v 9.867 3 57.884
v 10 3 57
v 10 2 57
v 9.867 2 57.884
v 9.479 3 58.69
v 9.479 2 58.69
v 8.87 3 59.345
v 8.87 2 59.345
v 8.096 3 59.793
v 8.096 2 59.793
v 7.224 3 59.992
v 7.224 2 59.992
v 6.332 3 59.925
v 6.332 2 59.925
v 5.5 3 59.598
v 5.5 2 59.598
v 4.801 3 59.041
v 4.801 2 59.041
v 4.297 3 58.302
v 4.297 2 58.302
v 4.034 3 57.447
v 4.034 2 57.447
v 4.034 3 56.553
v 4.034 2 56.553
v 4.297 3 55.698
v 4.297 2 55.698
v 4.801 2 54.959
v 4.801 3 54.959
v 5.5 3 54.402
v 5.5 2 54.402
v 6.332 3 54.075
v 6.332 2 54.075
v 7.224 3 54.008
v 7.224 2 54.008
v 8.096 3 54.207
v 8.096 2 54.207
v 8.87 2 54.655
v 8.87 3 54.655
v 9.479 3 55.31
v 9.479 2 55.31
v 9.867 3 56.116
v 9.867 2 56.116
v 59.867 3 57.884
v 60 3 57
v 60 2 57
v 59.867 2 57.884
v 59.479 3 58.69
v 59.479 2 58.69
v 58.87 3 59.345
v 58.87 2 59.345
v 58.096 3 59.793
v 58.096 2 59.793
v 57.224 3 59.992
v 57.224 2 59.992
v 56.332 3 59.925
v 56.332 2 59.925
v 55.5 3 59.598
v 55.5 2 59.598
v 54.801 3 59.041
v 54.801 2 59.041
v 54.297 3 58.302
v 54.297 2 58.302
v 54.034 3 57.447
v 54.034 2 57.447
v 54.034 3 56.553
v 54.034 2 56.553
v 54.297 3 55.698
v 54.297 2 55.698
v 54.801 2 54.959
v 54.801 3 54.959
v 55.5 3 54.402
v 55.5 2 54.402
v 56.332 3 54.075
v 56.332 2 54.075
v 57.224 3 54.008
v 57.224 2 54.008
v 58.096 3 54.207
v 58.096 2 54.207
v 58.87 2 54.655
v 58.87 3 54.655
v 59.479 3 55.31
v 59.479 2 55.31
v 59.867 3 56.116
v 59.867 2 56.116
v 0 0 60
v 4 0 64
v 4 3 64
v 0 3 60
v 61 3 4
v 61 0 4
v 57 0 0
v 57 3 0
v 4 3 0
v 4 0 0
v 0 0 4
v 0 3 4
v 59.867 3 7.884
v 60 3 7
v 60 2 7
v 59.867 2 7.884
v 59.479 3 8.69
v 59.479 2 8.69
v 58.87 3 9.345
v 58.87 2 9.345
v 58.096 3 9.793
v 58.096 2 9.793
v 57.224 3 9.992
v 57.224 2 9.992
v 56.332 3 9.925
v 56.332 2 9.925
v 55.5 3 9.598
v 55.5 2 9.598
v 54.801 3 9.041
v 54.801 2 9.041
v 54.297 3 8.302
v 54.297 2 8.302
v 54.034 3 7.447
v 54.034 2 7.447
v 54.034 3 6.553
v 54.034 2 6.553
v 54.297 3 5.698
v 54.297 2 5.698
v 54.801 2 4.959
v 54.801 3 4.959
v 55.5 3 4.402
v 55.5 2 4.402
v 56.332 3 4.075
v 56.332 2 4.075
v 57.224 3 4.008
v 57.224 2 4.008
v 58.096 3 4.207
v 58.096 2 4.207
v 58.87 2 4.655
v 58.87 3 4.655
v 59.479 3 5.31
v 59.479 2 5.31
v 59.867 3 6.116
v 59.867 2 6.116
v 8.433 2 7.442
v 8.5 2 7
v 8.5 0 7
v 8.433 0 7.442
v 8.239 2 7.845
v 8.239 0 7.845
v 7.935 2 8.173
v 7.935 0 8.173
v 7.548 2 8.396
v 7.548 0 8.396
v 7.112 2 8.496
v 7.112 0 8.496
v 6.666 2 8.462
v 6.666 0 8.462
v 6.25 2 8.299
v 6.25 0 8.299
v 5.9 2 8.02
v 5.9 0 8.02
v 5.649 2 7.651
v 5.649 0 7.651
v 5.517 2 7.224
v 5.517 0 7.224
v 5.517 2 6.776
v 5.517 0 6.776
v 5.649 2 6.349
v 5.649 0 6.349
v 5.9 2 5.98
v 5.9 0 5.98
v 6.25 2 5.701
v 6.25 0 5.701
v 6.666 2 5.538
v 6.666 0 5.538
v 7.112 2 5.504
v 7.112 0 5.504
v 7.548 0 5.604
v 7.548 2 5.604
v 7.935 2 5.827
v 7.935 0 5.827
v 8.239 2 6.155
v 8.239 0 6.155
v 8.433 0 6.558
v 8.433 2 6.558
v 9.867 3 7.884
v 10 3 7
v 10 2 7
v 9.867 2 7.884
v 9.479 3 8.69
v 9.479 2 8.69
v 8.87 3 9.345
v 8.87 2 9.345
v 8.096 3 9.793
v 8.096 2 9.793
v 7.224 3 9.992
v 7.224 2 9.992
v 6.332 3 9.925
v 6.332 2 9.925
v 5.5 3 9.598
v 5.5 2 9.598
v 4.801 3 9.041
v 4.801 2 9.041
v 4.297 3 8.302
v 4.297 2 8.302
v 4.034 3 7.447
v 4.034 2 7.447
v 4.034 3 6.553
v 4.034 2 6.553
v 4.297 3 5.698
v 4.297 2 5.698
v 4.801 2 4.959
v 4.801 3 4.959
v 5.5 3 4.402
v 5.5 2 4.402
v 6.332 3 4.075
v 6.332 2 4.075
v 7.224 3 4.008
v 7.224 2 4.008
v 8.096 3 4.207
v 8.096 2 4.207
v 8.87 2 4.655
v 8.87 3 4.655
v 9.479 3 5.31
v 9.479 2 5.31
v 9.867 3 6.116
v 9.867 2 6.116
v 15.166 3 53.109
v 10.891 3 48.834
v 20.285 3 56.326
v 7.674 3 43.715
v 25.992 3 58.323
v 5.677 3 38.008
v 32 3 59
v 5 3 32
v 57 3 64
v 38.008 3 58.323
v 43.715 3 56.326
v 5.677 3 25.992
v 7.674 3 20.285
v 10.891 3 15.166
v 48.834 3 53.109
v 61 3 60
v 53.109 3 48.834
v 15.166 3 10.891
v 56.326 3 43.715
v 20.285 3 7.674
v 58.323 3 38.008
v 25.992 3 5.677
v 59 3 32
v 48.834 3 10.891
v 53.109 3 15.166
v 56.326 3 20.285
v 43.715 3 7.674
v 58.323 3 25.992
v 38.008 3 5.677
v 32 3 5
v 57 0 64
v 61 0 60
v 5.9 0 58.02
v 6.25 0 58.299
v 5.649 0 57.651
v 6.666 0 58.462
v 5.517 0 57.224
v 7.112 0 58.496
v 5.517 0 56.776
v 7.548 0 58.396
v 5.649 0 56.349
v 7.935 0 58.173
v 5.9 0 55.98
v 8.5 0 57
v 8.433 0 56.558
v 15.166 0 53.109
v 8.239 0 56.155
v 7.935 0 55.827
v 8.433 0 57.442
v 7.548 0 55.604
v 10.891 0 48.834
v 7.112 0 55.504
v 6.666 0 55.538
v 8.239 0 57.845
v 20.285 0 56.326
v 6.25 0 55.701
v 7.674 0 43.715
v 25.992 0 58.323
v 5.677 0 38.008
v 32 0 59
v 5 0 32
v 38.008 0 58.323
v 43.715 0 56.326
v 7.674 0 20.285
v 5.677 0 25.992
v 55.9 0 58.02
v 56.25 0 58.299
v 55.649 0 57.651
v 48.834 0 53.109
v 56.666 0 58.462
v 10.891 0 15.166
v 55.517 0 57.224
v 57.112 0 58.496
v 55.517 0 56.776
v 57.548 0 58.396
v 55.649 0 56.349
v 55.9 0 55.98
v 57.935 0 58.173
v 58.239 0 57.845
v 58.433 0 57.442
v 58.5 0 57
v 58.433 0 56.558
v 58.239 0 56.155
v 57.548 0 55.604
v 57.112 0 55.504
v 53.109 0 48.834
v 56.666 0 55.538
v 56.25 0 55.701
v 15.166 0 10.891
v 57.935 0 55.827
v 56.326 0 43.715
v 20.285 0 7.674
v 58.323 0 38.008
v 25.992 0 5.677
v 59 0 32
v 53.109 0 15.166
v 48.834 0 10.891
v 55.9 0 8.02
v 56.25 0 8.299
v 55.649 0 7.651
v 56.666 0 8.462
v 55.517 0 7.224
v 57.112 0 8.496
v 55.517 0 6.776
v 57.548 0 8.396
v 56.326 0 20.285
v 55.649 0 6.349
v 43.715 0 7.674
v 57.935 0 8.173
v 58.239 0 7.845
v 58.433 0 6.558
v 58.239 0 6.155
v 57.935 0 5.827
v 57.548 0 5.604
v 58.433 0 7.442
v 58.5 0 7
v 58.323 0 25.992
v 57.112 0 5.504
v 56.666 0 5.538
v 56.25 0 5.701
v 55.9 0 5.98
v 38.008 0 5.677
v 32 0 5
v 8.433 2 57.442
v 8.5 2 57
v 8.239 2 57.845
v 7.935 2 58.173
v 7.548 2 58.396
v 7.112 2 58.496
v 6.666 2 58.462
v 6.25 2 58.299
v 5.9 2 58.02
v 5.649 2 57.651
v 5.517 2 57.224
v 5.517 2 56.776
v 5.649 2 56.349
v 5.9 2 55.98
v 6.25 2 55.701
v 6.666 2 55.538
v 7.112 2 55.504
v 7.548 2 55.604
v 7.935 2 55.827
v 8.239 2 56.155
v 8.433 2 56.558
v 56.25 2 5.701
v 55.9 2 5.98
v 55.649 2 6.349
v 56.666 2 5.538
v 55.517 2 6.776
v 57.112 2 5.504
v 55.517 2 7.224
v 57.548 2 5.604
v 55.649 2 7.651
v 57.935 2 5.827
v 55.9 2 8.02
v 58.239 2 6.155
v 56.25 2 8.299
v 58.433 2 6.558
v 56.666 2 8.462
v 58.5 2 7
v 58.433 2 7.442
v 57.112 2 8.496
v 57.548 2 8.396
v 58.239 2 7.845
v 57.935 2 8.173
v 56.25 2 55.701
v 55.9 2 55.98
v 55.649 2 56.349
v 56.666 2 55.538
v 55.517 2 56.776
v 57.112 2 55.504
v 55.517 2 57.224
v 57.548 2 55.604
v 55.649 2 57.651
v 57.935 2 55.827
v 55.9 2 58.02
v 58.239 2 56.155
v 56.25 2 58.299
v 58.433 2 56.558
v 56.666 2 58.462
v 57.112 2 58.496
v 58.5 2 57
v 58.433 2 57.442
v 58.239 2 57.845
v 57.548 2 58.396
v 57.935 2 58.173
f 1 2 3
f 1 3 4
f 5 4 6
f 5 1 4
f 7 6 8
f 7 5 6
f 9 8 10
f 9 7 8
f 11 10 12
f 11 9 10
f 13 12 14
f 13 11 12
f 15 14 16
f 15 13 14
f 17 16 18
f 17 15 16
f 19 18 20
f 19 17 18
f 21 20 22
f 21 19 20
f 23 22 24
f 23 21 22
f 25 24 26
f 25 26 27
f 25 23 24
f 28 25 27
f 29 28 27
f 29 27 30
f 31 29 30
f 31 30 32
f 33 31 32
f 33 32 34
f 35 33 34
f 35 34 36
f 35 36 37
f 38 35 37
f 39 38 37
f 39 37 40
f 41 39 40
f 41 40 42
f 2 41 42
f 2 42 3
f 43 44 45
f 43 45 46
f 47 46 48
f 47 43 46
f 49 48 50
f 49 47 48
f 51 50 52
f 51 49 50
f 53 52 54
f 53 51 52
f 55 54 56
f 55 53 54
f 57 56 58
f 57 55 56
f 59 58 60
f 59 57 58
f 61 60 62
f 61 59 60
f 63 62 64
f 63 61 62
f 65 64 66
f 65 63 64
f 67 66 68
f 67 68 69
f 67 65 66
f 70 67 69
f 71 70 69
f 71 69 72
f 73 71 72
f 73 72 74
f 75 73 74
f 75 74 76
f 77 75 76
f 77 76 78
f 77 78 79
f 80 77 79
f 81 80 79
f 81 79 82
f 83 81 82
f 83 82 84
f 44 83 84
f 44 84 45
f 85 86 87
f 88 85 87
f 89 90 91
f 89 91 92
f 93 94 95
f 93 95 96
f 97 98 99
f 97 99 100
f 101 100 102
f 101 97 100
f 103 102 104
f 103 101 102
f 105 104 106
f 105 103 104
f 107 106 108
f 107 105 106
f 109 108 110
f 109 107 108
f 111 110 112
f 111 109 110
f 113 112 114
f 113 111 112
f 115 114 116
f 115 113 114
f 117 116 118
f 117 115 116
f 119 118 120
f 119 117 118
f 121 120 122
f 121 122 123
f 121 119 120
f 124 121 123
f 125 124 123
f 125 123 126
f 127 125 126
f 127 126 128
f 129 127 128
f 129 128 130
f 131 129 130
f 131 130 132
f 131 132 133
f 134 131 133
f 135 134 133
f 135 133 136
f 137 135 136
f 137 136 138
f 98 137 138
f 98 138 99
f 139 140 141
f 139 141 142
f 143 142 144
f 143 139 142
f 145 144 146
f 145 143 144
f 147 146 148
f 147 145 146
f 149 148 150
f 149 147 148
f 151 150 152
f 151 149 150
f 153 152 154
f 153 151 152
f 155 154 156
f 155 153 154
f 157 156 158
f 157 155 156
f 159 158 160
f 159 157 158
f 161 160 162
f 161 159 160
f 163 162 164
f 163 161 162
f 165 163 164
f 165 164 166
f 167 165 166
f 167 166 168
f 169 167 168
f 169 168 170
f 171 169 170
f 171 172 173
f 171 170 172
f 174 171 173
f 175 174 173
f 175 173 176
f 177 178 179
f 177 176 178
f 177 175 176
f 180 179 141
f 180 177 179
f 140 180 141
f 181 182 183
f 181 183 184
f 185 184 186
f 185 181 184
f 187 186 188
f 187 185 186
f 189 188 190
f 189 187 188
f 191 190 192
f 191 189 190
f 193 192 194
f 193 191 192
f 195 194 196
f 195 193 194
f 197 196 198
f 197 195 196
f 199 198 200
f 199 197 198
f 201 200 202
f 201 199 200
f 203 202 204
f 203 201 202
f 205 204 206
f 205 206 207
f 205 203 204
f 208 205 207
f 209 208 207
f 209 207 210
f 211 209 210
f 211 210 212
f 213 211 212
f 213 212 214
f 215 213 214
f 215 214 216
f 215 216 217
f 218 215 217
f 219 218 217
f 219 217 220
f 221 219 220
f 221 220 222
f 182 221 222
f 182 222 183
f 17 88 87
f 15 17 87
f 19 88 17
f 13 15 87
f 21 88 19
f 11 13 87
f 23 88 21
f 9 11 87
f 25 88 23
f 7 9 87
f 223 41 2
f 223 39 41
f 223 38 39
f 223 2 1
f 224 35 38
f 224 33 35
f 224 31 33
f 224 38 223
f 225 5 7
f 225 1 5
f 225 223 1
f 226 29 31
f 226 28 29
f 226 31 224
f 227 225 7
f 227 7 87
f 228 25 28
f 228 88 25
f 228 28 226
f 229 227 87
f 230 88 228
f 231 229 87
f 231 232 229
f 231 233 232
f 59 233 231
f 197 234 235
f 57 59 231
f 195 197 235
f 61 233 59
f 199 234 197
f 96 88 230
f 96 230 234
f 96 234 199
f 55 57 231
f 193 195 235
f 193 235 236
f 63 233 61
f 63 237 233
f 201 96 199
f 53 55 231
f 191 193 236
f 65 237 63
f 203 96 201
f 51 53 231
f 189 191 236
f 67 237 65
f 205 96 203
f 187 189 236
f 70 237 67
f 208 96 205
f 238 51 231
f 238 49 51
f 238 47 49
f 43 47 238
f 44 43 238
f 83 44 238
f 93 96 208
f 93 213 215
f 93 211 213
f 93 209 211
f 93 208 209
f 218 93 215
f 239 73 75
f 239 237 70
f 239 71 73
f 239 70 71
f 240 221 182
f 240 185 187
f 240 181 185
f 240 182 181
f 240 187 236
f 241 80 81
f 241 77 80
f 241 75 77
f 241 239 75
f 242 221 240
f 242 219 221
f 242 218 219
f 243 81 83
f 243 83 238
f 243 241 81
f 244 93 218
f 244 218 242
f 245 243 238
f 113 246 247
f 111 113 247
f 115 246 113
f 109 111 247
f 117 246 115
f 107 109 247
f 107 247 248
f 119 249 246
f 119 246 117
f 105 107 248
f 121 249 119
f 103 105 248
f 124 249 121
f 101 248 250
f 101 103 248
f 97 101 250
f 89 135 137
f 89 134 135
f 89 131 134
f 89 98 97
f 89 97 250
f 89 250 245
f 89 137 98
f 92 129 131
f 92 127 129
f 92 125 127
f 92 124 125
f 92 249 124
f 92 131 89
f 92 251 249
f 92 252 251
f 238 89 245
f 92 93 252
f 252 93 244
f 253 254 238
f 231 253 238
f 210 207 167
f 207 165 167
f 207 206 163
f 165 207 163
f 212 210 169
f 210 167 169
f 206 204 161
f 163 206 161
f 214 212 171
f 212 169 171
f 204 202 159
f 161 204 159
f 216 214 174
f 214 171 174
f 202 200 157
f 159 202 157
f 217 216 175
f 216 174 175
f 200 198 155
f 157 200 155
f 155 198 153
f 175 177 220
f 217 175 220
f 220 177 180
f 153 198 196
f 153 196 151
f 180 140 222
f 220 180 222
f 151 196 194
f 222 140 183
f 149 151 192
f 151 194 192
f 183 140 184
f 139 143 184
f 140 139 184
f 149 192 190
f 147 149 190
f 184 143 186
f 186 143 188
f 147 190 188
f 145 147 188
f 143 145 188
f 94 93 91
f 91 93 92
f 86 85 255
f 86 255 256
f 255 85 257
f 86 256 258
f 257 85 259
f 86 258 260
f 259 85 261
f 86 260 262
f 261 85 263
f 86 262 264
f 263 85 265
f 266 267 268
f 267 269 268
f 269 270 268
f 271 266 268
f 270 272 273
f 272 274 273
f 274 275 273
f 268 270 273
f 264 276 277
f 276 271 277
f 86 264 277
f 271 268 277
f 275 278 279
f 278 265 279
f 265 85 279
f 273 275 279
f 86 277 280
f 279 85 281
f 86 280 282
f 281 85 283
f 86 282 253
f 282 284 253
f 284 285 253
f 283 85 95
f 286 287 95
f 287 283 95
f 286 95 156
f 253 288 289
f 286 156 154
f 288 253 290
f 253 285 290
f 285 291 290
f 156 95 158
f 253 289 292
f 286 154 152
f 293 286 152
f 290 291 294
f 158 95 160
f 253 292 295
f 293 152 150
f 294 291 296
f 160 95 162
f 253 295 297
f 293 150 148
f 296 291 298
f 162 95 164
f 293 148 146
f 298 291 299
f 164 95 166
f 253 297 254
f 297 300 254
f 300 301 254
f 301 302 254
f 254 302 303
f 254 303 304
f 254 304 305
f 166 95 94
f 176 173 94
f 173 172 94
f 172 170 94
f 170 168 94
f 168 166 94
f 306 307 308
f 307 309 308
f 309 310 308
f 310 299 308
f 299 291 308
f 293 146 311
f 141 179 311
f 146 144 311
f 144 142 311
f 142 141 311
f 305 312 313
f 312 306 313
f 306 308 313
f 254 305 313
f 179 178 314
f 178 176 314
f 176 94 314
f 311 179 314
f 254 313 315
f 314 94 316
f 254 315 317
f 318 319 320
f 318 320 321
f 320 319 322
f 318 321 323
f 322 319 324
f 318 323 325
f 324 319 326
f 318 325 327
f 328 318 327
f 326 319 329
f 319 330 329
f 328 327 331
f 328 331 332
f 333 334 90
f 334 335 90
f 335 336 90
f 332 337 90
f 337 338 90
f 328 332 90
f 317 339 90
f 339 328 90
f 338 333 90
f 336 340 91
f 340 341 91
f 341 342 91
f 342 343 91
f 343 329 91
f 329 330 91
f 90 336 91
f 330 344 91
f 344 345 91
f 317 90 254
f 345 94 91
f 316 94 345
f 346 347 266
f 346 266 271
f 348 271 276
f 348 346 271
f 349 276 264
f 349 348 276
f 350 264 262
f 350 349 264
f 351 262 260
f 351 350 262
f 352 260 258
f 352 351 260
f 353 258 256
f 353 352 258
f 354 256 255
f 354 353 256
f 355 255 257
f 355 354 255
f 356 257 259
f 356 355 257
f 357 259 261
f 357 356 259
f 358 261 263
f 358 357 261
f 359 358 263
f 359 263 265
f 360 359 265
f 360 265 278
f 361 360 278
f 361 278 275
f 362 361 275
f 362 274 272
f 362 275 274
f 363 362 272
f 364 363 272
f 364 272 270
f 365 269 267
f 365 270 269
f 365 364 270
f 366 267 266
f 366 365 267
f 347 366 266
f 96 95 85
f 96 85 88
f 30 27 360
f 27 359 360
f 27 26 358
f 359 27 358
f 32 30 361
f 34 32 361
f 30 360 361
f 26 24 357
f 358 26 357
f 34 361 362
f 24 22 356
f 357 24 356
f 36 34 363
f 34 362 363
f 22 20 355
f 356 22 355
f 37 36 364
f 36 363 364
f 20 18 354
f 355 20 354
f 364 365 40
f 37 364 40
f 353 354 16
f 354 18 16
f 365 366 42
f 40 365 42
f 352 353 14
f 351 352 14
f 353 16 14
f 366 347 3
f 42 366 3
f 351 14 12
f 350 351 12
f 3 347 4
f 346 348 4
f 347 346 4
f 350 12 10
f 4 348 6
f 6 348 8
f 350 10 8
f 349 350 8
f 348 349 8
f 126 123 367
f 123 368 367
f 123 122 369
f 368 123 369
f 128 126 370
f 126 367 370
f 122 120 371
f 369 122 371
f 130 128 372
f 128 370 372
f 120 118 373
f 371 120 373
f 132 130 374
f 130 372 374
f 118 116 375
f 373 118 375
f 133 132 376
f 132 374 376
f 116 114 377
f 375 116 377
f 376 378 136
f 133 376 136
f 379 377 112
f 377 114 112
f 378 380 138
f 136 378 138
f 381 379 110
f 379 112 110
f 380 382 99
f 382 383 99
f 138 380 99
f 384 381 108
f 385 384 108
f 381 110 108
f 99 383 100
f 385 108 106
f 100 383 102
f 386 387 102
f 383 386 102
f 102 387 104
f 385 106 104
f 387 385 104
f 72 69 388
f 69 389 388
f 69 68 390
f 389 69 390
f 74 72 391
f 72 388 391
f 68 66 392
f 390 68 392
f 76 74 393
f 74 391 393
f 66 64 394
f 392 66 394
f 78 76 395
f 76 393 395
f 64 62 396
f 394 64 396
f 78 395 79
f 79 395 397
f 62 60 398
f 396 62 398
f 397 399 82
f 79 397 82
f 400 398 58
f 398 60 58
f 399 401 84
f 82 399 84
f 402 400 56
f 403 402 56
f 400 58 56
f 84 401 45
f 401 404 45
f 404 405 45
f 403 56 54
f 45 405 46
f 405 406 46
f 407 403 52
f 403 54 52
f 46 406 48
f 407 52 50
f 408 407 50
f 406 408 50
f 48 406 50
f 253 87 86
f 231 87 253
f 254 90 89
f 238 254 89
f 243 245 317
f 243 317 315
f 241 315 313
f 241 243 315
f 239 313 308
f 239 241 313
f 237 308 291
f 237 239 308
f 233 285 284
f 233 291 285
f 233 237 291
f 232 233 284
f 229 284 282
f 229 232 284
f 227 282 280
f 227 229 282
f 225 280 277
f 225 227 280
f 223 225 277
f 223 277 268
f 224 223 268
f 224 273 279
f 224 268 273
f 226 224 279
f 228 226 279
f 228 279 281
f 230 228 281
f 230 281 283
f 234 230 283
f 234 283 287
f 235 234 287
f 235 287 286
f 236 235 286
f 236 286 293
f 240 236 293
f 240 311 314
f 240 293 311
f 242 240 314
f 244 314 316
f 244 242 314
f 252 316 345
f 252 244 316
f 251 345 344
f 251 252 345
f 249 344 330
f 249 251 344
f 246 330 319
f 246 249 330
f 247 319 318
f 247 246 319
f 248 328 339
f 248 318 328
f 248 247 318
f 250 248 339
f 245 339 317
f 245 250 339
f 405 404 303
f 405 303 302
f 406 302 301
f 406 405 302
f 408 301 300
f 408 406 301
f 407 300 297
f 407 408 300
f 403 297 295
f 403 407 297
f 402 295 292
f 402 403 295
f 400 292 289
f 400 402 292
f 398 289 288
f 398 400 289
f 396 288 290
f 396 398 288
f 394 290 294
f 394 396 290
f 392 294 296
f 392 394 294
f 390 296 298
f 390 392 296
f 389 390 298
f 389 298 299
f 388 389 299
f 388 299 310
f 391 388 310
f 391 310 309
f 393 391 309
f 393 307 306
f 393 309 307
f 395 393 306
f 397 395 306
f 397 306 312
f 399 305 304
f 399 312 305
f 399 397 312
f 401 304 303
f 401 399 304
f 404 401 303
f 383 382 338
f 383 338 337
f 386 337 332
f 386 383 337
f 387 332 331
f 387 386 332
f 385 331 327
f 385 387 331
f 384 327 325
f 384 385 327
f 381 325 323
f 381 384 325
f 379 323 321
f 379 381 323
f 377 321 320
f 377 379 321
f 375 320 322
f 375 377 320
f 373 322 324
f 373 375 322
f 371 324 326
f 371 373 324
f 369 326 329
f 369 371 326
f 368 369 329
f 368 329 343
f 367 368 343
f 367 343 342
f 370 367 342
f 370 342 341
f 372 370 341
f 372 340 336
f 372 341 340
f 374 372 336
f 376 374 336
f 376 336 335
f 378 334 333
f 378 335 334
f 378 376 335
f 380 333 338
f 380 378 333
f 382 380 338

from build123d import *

# Parameters (mm, degrees)
CYLINDER871_R     = 3
CYLINDER871_DEPTH = 3
CYLINDER872_R     = 3
CYLINDER872_DEPTH = 3
CYLINDER873_R     = 3
CYLINDER873_DEPTH = 3
CYLINDER870_R     = 3
CYLINDER870_DEPTH = 3
CYLINDER867_R     = 27
CYLINDER867_DEPTH = 10
CYLINDER864_R     = 1.5
CYLINDER864_DEPTH = 10
CYLINDER865_R     = 1.5
CYLINDER865_DEPTH = 10
CYLINDER866_R     = 1.5
CYLINDER866_DEPTH = 10
CYLINDER863_R     = 1.5
CYLINDER863_DEPTH = 10
BOX418_W          = 61
BOX418_H          = 3
BOX418_DEPTH      = 64
CHAMFER023_SIZE   = 4
CHAMFER024_SIZE   = 4


with BuildPart() as v_lec871:
    # Cylinder871 → Cylinder871 (new body)
    with BuildSketch(Plane(origin=(50, 0, 0), x_dir=(1, 0, 0), z_dir=(0, -1, 0))):
        Circle(CYLINDER871_R)
    extrude(amount=CYLINDER871_DEPTH)


with BuildPart() as v_lec872:
    # Cylinder872 → Cylinder872 (new body)
    with BuildSketch(Plane(origin=(50, 0, 50), x_dir=(1, 0, 0), z_dir=(0, -1, 0))):
        Circle(CYLINDER872_R)
    extrude(amount=CYLINDER872_DEPTH)


with BuildPart() as v_lec873:
    # Cylinder873 → Cylinder873 (new body)
    with BuildSketch(Plane(origin=(0, 0, 50), x_dir=(1, 0, 0), z_dir=(0, -1, 0))):
        Circle(CYLINDER873_R)
    extrude(amount=CYLINDER873_DEPTH)


with BuildPart() as compound499:
    # Cylinder870 → Cylinder870 (new body)
    with BuildSketch(Plane.XZ):
        Circle(CYLINDER870_R)
    extrude(amount=CYLINDER870_DEPTH)

    # Compound499: union Válec871, Válec872, Válec873
    add(v_lec871.part)
    add(v_lec872.part)
    add(v_lec873.part)


with BuildPart() as compound499_1:
    # Compound499 placement: moved
    add(compound499.part.moved(Location((7, 5, 7))))


with BuildPart() as v_lec867:
    # Cylinder867 → Cylinder867 (new body)
    with BuildSketch(Plane(origin=(32, 5, 32), x_dir=(1, 0, 0), z_dir=(0, -1, 0))):
        Circle(CYLINDER867_R)
    extrude(amount=CYLINDER867_DEPTH)


with BuildPart() as v_lec864:
    # Cylinder864 → Cylinder864 (new body)
    with BuildSketch(Plane(origin=(50, 0, 0), x_dir=(1, 0, 0), z_dir=(0, -1, 0))):
        Circle(CYLINDER864_R)
    extrude(amount=CYLINDER864_DEPTH)


with BuildPart() as v_lec865:
    # Cylinder865 → Cylinder865 (new body)
    with BuildSketch(Plane(origin=(50, 0, 50), x_dir=(1, 0, 0), z_dir=(0, -1, 0))):
        Circle(CYLINDER865_R)
    extrude(amount=CYLINDER865_DEPTH)


with BuildPart() as v_lec866:
    # Cylinder866 → Cylinder866 (new body)
    with BuildSketch(Plane(origin=(0, 0, 50), x_dir=(1, 0, 0), z_dir=(0, -1, 0))):
        Circle(CYLINDER866_R)
    extrude(amount=CYLINDER866_DEPTH)


with BuildPart() as compound498:
    # Cylinder863 → Cylinder863 (new body)
    with BuildSketch(Plane.XZ):
        Circle(CYLINDER863_R)
    extrude(amount=CYLINDER863_DEPTH)

    # Compound498: union Válec864, Válec865, Válec866
    add(v_lec864.part)
    add(v_lec865.part)
    add(v_lec866.part)


with BuildPart() as compound498_1:
    # Compound498 placement: moved
    add(compound498.part.moved(Location((7, 4, 7))))


with BuildPart() as chamfer024:
    # Box418 → Box418 (new body)
    with BuildSketch(Plane.XY):
        with Locations((30.5, 1.5)):
            Rectangle(BOX418_W, BOX418_H)
    extrude(amount=BOX418_DEPTH)

    # Cut015: cut Compound498
    add(compound498_1.part, mode=Mode.SUBTRACT)

    # Cut016: cut Válec867
    add(v_lec867.part, mode=Mode.SUBTRACT)

    # Cut019: cut Compound499
    add(compound499_1.part, mode=Mode.SUBTRACT)

    # Chamfer023
    chamfer023_edges = [chamfer024.edges().sort_by_distance(p)[0] for p in [
        (0, 1.5, 0),
        (61, 1.5, 0),
    ]]
    chamfer(chamfer023_edges, length=CHAMFER023_SIZE)

    # Chamfer024
    chamfer024_edges = [chamfer024.edges().sort_by_distance(p)[0] for p in [
        (0, 1.5, 64),
        (61, 1.5, 64),
    ]]
    chamfer(chamfer024_edges, length=CHAMFER024_SIZE)


solid = chamfer024.part
